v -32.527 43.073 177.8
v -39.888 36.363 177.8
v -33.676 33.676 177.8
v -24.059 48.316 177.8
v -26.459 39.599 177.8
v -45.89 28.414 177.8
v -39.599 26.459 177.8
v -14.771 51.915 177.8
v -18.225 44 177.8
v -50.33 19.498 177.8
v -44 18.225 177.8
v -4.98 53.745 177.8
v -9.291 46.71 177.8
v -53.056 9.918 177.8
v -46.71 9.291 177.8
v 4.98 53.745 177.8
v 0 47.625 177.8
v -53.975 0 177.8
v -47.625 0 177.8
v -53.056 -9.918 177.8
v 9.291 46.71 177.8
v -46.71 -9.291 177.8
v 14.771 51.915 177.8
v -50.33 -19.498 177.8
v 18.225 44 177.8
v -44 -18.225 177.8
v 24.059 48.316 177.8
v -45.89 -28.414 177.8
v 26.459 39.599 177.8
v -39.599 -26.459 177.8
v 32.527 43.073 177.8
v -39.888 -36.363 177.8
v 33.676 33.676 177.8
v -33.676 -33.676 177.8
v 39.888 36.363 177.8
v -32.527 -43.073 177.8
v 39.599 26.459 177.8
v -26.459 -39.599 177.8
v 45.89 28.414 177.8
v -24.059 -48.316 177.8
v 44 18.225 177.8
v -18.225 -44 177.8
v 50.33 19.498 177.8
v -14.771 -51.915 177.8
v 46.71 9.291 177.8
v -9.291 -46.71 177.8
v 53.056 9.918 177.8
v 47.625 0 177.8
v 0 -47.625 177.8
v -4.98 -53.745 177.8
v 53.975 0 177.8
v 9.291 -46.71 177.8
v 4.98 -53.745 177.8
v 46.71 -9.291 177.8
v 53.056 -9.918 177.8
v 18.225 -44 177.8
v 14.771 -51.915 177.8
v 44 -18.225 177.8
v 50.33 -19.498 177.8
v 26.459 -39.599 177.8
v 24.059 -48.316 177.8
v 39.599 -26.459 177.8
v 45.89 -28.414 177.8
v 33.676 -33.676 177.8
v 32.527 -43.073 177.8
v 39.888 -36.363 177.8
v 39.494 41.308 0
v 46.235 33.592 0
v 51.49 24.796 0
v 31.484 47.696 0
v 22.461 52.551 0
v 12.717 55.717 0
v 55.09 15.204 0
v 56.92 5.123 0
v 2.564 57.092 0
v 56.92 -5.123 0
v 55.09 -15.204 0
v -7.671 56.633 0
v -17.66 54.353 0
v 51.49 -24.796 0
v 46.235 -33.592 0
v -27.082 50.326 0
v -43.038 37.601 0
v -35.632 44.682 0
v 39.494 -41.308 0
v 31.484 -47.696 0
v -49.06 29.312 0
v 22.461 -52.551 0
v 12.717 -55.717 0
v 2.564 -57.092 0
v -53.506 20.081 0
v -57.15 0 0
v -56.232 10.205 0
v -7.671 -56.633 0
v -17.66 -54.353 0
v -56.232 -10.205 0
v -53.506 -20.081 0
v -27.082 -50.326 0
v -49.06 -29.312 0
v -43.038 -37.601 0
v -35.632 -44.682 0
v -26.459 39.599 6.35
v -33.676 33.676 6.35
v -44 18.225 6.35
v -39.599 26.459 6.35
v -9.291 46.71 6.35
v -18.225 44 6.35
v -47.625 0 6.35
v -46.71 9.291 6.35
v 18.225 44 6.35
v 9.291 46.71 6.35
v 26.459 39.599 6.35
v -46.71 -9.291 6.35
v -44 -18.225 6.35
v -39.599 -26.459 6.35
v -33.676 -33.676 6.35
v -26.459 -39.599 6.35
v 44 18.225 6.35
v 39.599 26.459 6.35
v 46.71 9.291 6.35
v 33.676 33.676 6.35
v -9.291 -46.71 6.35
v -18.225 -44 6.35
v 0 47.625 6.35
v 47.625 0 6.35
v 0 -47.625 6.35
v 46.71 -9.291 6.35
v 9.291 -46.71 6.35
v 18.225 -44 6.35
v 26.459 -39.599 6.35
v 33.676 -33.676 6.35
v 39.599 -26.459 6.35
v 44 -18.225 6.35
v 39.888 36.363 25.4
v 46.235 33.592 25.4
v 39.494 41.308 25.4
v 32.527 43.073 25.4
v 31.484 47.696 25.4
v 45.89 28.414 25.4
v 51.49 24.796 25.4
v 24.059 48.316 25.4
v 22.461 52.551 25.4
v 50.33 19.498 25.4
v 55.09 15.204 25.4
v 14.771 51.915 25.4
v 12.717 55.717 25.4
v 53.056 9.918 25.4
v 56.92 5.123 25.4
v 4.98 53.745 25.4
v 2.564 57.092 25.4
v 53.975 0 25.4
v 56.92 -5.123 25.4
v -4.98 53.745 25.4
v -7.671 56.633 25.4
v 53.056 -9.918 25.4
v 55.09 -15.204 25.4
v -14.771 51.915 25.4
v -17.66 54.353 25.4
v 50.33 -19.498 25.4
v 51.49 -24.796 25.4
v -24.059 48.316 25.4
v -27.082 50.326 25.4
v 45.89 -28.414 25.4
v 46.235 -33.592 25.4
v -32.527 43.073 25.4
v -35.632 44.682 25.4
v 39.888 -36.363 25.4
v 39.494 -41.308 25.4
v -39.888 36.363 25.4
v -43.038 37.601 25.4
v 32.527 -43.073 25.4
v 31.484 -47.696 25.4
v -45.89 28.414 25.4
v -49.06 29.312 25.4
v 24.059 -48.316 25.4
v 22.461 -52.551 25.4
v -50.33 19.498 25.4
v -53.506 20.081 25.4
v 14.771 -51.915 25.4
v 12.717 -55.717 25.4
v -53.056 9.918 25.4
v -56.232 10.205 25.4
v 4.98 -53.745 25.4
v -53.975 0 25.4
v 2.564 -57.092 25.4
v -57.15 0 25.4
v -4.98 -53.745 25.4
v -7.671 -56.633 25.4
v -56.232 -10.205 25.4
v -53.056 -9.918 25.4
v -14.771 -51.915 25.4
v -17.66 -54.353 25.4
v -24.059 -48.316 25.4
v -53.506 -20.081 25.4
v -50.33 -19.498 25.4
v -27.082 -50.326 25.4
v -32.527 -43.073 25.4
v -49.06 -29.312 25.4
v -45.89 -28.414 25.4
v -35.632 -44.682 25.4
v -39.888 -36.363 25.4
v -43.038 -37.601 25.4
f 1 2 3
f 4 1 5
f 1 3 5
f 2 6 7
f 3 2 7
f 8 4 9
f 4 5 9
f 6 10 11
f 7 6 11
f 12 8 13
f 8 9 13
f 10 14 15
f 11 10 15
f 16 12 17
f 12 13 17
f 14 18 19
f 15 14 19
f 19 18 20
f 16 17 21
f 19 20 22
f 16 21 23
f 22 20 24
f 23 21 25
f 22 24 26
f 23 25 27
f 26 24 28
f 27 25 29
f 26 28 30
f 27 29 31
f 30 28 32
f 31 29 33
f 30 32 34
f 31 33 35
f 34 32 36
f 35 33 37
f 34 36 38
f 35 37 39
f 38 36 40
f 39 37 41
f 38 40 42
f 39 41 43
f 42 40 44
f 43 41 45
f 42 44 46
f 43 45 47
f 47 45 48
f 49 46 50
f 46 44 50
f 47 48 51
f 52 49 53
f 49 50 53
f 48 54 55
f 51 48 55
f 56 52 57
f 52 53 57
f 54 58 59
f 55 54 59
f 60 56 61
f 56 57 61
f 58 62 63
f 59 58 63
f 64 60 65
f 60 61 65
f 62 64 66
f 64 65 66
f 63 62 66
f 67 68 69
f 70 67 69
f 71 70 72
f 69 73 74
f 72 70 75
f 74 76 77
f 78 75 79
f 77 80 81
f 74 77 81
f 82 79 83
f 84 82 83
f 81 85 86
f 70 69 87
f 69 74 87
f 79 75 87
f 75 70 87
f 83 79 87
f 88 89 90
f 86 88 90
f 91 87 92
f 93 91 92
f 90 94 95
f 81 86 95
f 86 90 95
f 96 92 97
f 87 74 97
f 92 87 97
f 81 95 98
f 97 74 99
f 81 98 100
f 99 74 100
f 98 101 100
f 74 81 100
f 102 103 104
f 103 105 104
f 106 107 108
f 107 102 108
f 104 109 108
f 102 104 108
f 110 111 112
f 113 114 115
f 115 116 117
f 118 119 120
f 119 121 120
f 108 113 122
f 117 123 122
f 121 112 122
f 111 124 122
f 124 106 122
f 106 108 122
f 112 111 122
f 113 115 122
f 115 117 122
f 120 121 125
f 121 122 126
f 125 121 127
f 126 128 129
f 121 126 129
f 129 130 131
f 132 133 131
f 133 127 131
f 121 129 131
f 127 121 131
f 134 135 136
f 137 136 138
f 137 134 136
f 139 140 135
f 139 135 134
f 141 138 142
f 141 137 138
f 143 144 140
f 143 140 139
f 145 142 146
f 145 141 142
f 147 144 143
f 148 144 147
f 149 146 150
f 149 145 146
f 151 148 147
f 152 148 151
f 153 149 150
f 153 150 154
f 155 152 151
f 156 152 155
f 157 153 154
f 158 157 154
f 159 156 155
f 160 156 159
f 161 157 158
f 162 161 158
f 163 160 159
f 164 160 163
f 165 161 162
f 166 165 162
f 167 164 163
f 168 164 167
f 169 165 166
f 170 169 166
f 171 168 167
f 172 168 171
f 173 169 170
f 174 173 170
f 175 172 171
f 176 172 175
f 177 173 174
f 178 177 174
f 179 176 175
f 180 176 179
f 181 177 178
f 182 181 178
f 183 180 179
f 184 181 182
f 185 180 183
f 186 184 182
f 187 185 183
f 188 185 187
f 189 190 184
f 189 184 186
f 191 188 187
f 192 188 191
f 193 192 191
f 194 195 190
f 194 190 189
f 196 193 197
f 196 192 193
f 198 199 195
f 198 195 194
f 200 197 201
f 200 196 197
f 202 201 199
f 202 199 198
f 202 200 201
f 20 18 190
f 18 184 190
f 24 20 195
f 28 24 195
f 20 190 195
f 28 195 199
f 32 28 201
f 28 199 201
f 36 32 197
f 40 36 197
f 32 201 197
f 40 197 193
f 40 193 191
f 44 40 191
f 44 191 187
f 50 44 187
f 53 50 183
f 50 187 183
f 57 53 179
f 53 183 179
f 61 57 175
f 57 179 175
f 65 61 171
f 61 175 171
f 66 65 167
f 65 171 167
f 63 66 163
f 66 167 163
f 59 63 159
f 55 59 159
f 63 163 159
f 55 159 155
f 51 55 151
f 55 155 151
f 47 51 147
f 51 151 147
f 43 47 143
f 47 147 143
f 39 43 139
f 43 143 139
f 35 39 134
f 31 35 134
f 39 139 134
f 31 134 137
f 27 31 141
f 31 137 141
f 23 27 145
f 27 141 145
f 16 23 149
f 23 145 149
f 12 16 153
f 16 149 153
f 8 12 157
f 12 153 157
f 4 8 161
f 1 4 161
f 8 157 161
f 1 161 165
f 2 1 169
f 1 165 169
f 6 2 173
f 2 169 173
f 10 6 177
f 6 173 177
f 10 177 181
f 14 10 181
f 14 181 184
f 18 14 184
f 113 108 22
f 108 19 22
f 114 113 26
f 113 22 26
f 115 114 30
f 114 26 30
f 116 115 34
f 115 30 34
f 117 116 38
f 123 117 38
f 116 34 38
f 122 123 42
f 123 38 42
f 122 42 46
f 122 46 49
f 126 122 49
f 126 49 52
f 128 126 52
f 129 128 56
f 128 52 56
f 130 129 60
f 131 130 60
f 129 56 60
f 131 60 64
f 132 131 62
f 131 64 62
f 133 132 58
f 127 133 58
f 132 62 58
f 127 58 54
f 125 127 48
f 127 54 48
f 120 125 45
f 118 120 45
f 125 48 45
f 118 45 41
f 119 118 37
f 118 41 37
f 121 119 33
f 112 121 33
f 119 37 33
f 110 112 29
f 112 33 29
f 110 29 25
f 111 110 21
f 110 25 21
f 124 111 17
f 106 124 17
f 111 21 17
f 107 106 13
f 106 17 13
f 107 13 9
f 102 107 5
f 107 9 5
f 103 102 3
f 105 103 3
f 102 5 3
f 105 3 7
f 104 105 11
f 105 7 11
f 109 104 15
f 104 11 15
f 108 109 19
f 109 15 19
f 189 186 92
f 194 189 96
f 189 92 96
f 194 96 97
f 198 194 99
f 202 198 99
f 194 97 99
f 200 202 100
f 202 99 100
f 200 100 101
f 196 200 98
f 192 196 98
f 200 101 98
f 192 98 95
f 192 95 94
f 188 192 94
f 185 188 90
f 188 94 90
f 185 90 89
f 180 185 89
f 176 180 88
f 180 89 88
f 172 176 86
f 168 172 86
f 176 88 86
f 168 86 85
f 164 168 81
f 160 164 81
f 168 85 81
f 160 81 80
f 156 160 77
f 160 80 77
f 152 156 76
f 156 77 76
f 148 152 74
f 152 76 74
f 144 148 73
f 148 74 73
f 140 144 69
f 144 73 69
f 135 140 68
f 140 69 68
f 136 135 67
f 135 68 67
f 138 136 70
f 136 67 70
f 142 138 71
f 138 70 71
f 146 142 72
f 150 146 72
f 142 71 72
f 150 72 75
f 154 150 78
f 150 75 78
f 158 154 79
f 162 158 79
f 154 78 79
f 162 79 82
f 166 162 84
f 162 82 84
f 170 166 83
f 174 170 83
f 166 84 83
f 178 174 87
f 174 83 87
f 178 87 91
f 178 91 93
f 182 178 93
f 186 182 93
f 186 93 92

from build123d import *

# Parameters (mm, degrees)
F0_W = 3.175
F0_H = 19.05


with BuildPart() as f1:
    # F0 (on Front) → F1 (revolve)
    with BuildSketch(Plane.XZ):
        Polygon((-57.15, 0), (0, 0), (0, 6.35), (-47.625, 6.35), (-53.975, 6.35), (-57.15, 6.35), align=None)
        with Locations((-55.5625, 15.875)):
            Rectangle(F0_W, F0_H)
        Polygon((-53.975, 6.35), (-47.625, 6.35), (-47.625, 177.8), (-53.975, 177.8), (-53.975, 25.4), align=None)
    revolve(axis=Axis((0, 0, 3.175), (0, 0, 1)))


solid = f1.part
